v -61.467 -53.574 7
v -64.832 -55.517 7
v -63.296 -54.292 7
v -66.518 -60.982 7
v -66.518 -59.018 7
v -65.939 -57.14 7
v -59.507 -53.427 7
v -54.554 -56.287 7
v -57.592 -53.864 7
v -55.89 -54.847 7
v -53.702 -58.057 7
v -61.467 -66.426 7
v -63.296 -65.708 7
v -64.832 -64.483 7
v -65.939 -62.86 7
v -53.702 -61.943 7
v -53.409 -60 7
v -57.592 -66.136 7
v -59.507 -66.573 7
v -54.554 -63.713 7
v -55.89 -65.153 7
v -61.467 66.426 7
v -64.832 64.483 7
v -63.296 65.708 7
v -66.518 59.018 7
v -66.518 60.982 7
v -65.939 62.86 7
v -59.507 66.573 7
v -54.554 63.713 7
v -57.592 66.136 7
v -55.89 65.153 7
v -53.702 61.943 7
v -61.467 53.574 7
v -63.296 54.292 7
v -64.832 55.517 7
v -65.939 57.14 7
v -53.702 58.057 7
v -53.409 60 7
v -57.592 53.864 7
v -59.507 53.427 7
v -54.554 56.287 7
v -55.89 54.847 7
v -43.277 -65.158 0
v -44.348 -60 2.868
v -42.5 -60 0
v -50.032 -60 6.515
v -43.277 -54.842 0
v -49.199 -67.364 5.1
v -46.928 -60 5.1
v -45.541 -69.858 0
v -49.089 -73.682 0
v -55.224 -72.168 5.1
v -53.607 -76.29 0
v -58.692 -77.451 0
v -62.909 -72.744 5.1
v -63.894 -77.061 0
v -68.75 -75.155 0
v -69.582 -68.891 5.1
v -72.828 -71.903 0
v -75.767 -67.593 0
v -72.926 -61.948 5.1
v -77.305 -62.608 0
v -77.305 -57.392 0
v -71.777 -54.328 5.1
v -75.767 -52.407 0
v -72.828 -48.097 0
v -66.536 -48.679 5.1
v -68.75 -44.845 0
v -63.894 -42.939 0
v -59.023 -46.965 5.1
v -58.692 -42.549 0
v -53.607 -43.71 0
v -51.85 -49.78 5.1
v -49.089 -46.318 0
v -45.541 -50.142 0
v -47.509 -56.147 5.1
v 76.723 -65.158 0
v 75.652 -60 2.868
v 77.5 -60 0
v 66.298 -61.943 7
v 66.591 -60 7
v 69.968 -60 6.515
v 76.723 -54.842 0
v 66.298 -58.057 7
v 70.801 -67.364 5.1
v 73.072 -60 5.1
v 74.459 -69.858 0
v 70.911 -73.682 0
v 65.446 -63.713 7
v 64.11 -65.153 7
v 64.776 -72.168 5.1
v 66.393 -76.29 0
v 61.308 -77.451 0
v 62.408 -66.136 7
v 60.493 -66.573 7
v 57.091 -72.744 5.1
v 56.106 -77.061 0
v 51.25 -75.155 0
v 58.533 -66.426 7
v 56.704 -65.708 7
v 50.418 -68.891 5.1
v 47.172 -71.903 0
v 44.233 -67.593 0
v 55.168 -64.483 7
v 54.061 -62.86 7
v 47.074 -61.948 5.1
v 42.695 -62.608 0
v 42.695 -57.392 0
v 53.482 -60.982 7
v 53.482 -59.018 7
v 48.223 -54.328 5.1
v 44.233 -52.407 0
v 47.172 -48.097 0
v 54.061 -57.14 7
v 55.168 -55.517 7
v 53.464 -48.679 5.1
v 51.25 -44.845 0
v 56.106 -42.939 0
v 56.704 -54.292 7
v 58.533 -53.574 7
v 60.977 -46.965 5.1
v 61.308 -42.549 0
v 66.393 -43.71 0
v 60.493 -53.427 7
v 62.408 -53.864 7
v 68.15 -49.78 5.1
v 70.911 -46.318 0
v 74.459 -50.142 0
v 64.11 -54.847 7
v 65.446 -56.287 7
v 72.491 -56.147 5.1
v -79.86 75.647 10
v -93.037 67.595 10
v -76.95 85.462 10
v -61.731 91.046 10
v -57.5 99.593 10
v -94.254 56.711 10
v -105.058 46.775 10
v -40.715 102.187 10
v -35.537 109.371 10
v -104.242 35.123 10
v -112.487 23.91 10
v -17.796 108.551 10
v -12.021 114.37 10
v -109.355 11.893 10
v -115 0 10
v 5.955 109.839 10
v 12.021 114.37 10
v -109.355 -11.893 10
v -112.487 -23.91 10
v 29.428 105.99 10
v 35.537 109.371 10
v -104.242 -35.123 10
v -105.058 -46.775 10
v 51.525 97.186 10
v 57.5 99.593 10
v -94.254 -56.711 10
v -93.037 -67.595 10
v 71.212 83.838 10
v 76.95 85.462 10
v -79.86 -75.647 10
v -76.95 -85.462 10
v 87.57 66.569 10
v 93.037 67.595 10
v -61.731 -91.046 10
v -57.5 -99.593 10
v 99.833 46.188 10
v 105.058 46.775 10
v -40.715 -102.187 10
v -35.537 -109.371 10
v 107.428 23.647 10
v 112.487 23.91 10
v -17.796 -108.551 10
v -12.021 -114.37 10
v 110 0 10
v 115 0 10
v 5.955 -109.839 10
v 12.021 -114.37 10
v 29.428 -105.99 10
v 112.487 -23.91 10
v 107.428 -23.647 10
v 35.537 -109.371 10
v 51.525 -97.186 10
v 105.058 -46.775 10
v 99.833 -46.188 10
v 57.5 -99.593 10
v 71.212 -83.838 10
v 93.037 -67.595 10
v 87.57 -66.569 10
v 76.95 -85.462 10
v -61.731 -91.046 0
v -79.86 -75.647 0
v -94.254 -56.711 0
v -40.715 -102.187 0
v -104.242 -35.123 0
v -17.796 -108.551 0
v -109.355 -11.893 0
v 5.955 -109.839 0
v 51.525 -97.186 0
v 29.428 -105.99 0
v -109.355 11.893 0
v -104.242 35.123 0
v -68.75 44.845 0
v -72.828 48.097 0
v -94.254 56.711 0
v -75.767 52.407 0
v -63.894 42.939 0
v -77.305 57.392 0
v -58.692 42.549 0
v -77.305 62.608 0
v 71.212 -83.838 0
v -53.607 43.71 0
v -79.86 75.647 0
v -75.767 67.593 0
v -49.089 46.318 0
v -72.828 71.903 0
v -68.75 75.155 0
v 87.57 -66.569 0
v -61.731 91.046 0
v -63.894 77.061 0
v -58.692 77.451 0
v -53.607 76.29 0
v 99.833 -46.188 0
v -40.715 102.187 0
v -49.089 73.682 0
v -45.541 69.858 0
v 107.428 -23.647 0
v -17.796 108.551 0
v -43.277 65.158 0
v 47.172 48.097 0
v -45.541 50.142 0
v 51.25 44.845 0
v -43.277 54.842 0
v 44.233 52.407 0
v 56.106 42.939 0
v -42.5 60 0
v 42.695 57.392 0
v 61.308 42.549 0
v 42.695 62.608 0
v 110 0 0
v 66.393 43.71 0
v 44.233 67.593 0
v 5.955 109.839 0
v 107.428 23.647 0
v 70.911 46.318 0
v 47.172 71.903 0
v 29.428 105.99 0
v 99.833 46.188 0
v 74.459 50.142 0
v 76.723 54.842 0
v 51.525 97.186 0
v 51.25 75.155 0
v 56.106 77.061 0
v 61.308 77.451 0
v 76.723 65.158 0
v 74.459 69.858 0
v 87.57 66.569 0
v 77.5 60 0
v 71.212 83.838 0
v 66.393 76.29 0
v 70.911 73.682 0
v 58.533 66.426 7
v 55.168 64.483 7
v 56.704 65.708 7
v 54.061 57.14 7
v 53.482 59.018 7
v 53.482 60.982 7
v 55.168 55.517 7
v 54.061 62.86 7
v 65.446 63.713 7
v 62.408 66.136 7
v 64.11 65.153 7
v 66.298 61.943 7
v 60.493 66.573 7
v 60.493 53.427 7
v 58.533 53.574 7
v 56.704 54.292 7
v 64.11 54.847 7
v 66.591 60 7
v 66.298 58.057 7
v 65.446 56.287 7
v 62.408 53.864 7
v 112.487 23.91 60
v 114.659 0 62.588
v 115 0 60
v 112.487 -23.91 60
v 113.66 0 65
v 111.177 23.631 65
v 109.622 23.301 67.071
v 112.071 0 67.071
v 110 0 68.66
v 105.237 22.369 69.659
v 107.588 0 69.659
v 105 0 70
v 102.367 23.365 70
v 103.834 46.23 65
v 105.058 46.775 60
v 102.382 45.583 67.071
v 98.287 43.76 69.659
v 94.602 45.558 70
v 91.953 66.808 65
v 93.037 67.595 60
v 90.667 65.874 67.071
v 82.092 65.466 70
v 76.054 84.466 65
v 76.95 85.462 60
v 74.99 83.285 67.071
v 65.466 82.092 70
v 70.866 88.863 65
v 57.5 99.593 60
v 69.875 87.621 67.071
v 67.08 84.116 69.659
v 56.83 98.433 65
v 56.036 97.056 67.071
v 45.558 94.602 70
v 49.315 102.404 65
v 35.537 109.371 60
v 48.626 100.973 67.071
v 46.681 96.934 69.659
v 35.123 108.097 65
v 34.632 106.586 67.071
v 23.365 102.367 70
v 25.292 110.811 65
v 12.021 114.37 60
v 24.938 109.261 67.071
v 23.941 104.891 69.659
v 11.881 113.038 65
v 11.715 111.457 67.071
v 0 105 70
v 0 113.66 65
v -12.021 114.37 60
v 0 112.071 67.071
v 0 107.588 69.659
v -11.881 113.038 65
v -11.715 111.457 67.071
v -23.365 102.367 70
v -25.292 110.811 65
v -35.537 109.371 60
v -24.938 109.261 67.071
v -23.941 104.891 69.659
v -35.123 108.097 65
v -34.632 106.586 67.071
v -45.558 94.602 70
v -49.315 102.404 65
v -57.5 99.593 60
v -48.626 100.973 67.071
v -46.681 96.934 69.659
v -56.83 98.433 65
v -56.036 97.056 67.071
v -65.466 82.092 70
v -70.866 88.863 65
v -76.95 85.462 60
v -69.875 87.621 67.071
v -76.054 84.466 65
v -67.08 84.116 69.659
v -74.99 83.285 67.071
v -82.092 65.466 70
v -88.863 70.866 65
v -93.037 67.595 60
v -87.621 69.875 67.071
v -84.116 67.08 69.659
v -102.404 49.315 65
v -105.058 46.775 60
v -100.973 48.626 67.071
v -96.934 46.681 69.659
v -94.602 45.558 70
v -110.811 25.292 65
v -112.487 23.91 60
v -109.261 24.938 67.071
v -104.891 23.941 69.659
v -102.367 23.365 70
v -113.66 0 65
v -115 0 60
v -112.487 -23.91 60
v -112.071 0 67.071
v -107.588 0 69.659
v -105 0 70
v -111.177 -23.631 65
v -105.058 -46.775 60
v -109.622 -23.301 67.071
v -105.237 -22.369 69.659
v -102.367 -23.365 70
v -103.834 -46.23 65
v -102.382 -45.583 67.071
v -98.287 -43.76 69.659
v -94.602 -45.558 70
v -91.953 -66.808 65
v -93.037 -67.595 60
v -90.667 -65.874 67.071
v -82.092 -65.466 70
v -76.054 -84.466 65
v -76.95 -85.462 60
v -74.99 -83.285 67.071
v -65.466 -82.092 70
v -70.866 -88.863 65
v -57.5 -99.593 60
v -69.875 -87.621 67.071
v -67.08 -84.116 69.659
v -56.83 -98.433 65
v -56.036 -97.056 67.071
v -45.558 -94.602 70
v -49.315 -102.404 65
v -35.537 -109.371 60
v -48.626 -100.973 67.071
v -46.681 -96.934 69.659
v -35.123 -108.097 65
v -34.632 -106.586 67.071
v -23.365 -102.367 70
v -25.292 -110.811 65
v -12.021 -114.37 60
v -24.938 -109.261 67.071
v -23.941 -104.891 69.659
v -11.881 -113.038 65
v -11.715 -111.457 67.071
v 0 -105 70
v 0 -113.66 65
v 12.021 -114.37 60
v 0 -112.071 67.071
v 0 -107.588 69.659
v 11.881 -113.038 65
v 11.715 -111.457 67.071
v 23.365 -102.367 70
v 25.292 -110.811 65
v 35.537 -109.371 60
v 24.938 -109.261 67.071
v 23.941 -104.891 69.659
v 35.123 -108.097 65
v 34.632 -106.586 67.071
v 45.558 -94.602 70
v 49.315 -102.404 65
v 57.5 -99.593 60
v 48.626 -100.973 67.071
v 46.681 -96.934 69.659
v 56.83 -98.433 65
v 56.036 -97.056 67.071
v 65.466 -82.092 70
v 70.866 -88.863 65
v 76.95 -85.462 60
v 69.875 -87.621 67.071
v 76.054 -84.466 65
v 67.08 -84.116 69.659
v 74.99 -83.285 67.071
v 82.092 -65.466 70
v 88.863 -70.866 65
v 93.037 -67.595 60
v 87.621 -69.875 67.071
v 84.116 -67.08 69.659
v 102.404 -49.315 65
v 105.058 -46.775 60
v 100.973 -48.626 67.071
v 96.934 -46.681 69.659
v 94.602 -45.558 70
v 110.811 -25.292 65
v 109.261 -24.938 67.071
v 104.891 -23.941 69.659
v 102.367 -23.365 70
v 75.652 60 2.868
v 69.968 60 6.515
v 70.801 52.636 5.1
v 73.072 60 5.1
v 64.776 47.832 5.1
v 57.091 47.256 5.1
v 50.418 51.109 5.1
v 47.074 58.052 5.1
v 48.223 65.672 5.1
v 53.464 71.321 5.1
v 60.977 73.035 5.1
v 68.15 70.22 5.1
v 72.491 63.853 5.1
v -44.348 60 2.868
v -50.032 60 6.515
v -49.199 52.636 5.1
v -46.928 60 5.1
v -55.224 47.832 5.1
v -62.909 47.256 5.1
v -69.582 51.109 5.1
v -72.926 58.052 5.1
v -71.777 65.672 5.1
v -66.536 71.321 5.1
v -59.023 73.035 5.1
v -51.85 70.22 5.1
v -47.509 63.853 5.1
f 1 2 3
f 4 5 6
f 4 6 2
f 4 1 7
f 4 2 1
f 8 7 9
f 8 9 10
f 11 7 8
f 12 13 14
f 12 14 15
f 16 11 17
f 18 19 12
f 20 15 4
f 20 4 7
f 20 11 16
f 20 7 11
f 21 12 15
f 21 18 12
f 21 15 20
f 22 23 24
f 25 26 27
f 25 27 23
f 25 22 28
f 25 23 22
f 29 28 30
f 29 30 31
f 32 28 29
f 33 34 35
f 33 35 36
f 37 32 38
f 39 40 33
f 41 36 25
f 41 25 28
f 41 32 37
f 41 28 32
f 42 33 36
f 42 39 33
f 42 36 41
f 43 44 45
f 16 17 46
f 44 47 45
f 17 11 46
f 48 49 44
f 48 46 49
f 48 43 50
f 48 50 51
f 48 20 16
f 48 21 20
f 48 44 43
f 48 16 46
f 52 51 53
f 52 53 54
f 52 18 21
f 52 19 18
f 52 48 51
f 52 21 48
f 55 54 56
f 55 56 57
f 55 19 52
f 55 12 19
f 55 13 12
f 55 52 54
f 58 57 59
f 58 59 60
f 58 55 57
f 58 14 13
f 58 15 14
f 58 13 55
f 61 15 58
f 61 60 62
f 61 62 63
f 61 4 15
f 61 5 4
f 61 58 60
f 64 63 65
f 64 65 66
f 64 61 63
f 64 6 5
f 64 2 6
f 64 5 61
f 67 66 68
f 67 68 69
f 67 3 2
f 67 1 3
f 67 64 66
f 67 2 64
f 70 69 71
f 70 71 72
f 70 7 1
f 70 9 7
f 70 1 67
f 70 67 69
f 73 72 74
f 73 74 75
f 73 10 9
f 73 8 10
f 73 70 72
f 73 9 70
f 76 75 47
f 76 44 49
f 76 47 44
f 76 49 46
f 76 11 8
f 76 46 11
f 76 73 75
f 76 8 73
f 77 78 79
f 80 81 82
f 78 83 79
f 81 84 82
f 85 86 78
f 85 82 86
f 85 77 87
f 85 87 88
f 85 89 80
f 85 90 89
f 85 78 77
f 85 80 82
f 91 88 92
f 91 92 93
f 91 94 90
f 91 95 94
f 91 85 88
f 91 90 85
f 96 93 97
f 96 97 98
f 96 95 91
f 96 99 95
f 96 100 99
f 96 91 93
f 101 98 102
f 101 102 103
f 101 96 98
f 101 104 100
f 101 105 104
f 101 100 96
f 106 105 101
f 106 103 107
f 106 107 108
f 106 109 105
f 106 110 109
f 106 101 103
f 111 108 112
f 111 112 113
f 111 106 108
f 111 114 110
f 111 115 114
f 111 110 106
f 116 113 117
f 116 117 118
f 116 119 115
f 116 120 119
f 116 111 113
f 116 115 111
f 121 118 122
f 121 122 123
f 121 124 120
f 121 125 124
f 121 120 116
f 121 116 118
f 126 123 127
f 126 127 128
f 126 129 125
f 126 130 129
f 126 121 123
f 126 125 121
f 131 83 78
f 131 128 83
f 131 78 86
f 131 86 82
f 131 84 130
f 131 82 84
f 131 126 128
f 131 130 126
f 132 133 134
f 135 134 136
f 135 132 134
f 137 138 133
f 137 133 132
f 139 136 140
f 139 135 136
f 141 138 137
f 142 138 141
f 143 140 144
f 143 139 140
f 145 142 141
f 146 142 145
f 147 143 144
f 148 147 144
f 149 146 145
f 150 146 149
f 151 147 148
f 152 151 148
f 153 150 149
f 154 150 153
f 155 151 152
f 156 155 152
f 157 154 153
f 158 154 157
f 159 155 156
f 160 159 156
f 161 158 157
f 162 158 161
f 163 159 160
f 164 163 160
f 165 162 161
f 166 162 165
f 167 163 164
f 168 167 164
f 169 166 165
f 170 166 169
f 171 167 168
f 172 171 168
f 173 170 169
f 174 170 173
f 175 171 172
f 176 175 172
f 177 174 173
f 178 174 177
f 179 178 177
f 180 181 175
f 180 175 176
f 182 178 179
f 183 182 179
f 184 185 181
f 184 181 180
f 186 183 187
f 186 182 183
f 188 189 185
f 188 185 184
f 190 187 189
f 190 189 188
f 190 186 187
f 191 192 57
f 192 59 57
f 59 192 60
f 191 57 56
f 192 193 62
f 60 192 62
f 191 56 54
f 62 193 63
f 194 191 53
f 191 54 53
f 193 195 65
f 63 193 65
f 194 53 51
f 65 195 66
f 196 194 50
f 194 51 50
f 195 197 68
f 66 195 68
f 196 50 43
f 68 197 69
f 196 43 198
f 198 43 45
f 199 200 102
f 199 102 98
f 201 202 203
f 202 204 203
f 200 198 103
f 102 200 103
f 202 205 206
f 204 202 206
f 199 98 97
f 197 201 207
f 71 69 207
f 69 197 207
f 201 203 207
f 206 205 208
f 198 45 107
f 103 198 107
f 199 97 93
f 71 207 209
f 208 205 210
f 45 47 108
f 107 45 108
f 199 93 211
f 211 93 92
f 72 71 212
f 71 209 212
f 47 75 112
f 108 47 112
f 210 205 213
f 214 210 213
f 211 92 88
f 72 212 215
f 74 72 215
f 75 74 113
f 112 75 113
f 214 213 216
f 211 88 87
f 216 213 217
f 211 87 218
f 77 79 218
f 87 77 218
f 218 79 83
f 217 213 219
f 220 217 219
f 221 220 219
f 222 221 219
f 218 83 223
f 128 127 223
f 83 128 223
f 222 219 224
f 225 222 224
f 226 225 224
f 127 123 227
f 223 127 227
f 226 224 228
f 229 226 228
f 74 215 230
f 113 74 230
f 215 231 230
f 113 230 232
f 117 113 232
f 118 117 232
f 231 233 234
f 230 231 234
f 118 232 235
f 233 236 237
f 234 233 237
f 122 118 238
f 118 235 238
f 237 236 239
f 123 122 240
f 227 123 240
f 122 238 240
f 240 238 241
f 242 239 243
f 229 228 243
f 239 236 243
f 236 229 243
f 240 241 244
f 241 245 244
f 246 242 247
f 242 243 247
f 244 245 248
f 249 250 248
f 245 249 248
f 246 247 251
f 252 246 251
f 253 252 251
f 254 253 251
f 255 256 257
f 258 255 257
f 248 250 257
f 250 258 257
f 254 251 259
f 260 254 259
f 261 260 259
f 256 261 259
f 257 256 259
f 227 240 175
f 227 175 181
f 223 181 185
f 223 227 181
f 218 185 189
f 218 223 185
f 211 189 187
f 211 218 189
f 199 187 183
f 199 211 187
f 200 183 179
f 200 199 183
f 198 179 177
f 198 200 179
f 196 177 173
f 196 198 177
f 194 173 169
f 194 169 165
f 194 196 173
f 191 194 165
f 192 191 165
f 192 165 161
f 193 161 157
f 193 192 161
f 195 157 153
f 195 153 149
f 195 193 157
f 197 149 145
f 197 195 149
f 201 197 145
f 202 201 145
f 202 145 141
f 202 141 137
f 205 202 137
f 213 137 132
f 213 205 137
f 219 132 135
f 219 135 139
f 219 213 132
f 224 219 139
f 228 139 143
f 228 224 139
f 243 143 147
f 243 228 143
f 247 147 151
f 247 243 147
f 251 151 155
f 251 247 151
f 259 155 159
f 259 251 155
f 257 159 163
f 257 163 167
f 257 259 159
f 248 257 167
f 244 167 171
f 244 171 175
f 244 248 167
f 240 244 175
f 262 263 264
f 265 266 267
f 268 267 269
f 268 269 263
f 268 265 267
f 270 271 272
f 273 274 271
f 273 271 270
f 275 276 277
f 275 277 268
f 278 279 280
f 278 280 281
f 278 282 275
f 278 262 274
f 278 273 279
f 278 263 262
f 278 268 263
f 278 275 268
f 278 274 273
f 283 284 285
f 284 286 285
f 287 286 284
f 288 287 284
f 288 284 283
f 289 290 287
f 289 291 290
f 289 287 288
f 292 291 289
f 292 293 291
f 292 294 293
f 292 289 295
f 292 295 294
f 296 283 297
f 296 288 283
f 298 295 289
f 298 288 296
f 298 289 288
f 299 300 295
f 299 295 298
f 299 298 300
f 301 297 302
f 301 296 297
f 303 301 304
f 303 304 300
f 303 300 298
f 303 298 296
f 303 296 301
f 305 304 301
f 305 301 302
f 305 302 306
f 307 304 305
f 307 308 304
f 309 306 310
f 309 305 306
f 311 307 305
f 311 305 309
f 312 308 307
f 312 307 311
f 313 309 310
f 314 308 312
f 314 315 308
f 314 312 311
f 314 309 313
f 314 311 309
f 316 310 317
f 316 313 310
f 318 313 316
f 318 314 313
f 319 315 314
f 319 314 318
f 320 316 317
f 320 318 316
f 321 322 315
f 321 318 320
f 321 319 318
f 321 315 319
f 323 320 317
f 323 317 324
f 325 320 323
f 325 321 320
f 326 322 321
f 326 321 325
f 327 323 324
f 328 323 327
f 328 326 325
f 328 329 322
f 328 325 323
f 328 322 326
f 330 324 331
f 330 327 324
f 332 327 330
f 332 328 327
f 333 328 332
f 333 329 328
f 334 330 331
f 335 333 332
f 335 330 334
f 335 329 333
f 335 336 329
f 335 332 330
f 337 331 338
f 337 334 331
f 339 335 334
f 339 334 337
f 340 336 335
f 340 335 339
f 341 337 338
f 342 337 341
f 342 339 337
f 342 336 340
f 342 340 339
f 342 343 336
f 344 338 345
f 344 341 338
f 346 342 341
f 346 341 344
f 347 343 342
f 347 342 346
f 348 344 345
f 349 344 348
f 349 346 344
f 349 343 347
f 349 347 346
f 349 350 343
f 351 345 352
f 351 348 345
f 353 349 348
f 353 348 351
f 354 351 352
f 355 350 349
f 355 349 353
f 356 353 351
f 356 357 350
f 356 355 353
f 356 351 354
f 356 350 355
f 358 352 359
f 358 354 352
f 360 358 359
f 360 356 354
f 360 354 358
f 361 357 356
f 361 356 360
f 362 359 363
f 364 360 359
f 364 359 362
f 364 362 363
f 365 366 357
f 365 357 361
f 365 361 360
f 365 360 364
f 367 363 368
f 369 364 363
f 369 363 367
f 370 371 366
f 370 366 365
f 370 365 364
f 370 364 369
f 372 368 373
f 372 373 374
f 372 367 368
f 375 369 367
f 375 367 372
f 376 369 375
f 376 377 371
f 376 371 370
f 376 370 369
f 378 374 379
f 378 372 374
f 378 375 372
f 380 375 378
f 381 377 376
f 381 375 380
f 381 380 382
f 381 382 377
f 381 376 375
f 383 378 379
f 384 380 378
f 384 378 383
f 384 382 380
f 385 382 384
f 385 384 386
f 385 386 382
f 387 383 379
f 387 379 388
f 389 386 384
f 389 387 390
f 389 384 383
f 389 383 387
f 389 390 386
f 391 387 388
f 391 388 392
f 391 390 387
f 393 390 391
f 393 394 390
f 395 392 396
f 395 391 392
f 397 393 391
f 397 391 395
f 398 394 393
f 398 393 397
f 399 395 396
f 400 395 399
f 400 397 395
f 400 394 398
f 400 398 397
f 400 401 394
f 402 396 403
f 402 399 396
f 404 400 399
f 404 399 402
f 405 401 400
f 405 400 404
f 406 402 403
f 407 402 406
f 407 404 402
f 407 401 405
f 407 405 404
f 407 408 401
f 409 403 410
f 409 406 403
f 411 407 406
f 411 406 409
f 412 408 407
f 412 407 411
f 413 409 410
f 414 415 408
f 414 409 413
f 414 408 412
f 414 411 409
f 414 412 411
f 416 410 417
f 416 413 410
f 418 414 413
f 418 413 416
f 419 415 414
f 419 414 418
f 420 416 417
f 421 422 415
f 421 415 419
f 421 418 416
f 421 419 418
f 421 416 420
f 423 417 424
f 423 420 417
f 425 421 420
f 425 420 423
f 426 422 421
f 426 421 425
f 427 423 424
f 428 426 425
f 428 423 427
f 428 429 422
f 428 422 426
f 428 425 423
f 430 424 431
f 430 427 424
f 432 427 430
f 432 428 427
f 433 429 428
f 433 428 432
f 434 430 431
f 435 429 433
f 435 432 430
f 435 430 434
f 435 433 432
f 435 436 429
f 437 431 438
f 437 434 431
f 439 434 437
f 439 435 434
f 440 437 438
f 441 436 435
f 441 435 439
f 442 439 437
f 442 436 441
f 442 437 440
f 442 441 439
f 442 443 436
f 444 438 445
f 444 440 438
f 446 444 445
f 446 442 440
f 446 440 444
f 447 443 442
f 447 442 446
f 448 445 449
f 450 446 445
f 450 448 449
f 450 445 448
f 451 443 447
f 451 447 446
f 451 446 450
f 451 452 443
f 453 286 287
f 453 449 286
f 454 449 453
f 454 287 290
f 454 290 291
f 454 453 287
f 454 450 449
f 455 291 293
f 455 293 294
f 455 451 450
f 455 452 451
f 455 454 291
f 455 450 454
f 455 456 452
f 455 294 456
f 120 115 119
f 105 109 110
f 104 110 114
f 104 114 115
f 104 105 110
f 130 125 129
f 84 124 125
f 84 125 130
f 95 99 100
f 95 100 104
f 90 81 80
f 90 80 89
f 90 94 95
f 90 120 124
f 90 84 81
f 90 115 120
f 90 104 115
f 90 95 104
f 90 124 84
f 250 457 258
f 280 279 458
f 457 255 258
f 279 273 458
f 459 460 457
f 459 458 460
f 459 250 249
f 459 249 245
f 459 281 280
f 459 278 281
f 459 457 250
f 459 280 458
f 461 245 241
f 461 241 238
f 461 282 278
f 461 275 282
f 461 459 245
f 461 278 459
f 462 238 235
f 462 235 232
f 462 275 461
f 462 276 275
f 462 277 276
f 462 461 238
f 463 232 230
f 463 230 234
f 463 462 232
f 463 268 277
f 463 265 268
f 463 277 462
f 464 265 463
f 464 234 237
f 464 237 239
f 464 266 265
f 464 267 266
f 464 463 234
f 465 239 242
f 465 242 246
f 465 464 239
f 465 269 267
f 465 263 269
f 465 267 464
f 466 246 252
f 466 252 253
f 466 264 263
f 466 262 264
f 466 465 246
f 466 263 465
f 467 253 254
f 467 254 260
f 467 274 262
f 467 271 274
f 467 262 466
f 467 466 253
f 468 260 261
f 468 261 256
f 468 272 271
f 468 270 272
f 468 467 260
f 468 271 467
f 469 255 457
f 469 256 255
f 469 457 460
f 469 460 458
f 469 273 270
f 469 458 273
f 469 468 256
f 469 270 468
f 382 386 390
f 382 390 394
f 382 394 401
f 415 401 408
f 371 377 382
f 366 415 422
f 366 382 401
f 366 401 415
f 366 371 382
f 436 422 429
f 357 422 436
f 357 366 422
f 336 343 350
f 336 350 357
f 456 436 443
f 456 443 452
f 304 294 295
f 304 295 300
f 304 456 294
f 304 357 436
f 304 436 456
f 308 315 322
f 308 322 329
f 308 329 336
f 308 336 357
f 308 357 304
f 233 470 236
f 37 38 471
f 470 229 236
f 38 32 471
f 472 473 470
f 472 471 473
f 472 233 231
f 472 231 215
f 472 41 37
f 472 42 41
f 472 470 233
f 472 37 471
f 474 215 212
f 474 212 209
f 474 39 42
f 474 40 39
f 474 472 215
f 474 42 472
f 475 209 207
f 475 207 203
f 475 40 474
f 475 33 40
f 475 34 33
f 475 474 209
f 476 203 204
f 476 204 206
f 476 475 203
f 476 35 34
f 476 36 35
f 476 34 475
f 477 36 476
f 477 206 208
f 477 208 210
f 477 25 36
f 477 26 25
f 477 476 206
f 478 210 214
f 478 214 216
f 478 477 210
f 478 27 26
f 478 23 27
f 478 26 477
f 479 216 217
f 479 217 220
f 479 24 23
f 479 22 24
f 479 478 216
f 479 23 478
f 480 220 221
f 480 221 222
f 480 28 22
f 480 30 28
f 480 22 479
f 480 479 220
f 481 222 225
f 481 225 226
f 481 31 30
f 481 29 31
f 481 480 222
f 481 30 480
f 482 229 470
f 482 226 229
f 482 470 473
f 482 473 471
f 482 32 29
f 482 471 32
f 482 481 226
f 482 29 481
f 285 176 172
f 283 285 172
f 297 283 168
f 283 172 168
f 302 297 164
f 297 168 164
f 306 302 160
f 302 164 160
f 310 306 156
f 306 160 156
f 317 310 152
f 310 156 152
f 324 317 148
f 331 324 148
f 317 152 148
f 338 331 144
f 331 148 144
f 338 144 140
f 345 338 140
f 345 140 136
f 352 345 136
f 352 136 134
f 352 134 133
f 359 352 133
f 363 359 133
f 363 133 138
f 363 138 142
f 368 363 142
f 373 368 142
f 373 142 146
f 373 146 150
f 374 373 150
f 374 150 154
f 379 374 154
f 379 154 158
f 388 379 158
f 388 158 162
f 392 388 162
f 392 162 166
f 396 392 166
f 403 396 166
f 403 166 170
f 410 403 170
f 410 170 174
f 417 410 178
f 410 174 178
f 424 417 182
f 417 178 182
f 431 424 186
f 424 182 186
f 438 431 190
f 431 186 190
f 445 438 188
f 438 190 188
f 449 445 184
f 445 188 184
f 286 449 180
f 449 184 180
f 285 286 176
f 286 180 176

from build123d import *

# Parameters (mm, degrees)
F0_R     = 115
F1_DEPTH = 70
F2_R     = 17.5
F3_DEPTH = 7
F5_R     = 10
F6_R     = 115
F6_R_2   = 110
F7_DEPTH = 10


# Not quite as in the source:
# - a fillet or chamfer that OpenCascade refuses, or shapes differently, is made with other operations: its cross-section is extruded or revolved along the edge and cut away or added


with BuildPart() as f1:
    # F0 (on Top) → F1 (new body)
    with BuildSketch(Plane.XY):
        Circle(F0_R)
    extrude(amount=F1_DEPTH)

    # F2 (on face) → F3 (cut)
    with BuildSketch(Plane(origin=(0, 0, 0), x_dir=(1, 0, 0), z_dir=(0, 0, -1))):
        with Locations((-60, 60)):
            Circle(F2_R)
        with Locations((-60, -60)):
            Circle(F2_R)
        with Locations((60, -60)):
            Circle(F2_R)
        with Locations((60, 60)):
            Circle(F2_R)
    extrude(amount=-F3_DEPTH, mode=Mode.SUBTRACT)

    # F4: fillet of radius 12 on 4 edges, made by hand

    # F4_s1 → F4_t2 (revolve)
    with BuildSketch(Plane.XZ.offset(60)):
        with BuildLine():
            ThreePointArc((-42.5, 0), (-46.9279714162, 5.0995049384), (-53.4087121146, 7))
            Line((-53.4087121146, 7), (-42.5, 7))
            Line((-42.5, 7), (-42.5, 0))
        make_face()
    revolve(axis=Axis((-60, -60, 7), (0, 0, -1)))

    # F4_s3 → F4_t4 (revolve)
    with BuildSketch(Plane.XZ.offset(-60)):
        with BuildLine():
            ThreePointArc((-42.5, 0), (-46.9279714162, 5.0995049384), (-53.4087121146, 7))
            Line((-53.4087121146, 7), (-42.5, 7))
            Line((-42.5, 7), (-42.5, 0))
        make_face()
    revolve(axis=Axis((-60, 60, 7), (0, 0, -1)))

    # F4_s5 → F4_t6 (revolve)
    with BuildSketch(Plane.XZ.offset(-60)):
        with BuildLine():
            ThreePointArc((77.5, 0), (73.0720285838, 5.0995049384), (66.5912878854, 7))
            Line((66.5912878854, 7), (77.5, 7))
            Line((77.5, 7), (77.5, 0))
        make_face()
    revolve(axis=Axis((60, 60, 7), (0, 0, -1)))

    # F4_s7 → F4_t8 (revolve)
    with BuildSketch(Plane.XZ.offset(60)):
        with BuildLine():
            ThreePointArc((77.5, 0), (73.0720285838, 5.0995049384), (66.5912878854, 7))
            Line((66.5912878854, 7), (77.5, 7))
            Line((77.5, 7), (77.5, 0))
        make_face()
    revolve(axis=Axis((60, -60, 7), (0, 0, -1)))

    # F5
    f5_edges = [f1.edges().sort_by_distance(p)[0] for p in [
        (-115, 0, 70),
    ]]
    fillet(f5_edges, radius=F5_R)

    # F6 (on face) → F7 (cut)
    with BuildSketch(Plane(origin=(0, 0, 0), x_dir=(1, 0, 0), z_dir=(0, 0, -1))):
        Circle(F6_R)
        Circle(F6_R_2, mode=Mode.SUBTRACT)
    extrude(amount=-F7_DEPTH, mode=Mode.SUBTRACT)


solid = f1.part
